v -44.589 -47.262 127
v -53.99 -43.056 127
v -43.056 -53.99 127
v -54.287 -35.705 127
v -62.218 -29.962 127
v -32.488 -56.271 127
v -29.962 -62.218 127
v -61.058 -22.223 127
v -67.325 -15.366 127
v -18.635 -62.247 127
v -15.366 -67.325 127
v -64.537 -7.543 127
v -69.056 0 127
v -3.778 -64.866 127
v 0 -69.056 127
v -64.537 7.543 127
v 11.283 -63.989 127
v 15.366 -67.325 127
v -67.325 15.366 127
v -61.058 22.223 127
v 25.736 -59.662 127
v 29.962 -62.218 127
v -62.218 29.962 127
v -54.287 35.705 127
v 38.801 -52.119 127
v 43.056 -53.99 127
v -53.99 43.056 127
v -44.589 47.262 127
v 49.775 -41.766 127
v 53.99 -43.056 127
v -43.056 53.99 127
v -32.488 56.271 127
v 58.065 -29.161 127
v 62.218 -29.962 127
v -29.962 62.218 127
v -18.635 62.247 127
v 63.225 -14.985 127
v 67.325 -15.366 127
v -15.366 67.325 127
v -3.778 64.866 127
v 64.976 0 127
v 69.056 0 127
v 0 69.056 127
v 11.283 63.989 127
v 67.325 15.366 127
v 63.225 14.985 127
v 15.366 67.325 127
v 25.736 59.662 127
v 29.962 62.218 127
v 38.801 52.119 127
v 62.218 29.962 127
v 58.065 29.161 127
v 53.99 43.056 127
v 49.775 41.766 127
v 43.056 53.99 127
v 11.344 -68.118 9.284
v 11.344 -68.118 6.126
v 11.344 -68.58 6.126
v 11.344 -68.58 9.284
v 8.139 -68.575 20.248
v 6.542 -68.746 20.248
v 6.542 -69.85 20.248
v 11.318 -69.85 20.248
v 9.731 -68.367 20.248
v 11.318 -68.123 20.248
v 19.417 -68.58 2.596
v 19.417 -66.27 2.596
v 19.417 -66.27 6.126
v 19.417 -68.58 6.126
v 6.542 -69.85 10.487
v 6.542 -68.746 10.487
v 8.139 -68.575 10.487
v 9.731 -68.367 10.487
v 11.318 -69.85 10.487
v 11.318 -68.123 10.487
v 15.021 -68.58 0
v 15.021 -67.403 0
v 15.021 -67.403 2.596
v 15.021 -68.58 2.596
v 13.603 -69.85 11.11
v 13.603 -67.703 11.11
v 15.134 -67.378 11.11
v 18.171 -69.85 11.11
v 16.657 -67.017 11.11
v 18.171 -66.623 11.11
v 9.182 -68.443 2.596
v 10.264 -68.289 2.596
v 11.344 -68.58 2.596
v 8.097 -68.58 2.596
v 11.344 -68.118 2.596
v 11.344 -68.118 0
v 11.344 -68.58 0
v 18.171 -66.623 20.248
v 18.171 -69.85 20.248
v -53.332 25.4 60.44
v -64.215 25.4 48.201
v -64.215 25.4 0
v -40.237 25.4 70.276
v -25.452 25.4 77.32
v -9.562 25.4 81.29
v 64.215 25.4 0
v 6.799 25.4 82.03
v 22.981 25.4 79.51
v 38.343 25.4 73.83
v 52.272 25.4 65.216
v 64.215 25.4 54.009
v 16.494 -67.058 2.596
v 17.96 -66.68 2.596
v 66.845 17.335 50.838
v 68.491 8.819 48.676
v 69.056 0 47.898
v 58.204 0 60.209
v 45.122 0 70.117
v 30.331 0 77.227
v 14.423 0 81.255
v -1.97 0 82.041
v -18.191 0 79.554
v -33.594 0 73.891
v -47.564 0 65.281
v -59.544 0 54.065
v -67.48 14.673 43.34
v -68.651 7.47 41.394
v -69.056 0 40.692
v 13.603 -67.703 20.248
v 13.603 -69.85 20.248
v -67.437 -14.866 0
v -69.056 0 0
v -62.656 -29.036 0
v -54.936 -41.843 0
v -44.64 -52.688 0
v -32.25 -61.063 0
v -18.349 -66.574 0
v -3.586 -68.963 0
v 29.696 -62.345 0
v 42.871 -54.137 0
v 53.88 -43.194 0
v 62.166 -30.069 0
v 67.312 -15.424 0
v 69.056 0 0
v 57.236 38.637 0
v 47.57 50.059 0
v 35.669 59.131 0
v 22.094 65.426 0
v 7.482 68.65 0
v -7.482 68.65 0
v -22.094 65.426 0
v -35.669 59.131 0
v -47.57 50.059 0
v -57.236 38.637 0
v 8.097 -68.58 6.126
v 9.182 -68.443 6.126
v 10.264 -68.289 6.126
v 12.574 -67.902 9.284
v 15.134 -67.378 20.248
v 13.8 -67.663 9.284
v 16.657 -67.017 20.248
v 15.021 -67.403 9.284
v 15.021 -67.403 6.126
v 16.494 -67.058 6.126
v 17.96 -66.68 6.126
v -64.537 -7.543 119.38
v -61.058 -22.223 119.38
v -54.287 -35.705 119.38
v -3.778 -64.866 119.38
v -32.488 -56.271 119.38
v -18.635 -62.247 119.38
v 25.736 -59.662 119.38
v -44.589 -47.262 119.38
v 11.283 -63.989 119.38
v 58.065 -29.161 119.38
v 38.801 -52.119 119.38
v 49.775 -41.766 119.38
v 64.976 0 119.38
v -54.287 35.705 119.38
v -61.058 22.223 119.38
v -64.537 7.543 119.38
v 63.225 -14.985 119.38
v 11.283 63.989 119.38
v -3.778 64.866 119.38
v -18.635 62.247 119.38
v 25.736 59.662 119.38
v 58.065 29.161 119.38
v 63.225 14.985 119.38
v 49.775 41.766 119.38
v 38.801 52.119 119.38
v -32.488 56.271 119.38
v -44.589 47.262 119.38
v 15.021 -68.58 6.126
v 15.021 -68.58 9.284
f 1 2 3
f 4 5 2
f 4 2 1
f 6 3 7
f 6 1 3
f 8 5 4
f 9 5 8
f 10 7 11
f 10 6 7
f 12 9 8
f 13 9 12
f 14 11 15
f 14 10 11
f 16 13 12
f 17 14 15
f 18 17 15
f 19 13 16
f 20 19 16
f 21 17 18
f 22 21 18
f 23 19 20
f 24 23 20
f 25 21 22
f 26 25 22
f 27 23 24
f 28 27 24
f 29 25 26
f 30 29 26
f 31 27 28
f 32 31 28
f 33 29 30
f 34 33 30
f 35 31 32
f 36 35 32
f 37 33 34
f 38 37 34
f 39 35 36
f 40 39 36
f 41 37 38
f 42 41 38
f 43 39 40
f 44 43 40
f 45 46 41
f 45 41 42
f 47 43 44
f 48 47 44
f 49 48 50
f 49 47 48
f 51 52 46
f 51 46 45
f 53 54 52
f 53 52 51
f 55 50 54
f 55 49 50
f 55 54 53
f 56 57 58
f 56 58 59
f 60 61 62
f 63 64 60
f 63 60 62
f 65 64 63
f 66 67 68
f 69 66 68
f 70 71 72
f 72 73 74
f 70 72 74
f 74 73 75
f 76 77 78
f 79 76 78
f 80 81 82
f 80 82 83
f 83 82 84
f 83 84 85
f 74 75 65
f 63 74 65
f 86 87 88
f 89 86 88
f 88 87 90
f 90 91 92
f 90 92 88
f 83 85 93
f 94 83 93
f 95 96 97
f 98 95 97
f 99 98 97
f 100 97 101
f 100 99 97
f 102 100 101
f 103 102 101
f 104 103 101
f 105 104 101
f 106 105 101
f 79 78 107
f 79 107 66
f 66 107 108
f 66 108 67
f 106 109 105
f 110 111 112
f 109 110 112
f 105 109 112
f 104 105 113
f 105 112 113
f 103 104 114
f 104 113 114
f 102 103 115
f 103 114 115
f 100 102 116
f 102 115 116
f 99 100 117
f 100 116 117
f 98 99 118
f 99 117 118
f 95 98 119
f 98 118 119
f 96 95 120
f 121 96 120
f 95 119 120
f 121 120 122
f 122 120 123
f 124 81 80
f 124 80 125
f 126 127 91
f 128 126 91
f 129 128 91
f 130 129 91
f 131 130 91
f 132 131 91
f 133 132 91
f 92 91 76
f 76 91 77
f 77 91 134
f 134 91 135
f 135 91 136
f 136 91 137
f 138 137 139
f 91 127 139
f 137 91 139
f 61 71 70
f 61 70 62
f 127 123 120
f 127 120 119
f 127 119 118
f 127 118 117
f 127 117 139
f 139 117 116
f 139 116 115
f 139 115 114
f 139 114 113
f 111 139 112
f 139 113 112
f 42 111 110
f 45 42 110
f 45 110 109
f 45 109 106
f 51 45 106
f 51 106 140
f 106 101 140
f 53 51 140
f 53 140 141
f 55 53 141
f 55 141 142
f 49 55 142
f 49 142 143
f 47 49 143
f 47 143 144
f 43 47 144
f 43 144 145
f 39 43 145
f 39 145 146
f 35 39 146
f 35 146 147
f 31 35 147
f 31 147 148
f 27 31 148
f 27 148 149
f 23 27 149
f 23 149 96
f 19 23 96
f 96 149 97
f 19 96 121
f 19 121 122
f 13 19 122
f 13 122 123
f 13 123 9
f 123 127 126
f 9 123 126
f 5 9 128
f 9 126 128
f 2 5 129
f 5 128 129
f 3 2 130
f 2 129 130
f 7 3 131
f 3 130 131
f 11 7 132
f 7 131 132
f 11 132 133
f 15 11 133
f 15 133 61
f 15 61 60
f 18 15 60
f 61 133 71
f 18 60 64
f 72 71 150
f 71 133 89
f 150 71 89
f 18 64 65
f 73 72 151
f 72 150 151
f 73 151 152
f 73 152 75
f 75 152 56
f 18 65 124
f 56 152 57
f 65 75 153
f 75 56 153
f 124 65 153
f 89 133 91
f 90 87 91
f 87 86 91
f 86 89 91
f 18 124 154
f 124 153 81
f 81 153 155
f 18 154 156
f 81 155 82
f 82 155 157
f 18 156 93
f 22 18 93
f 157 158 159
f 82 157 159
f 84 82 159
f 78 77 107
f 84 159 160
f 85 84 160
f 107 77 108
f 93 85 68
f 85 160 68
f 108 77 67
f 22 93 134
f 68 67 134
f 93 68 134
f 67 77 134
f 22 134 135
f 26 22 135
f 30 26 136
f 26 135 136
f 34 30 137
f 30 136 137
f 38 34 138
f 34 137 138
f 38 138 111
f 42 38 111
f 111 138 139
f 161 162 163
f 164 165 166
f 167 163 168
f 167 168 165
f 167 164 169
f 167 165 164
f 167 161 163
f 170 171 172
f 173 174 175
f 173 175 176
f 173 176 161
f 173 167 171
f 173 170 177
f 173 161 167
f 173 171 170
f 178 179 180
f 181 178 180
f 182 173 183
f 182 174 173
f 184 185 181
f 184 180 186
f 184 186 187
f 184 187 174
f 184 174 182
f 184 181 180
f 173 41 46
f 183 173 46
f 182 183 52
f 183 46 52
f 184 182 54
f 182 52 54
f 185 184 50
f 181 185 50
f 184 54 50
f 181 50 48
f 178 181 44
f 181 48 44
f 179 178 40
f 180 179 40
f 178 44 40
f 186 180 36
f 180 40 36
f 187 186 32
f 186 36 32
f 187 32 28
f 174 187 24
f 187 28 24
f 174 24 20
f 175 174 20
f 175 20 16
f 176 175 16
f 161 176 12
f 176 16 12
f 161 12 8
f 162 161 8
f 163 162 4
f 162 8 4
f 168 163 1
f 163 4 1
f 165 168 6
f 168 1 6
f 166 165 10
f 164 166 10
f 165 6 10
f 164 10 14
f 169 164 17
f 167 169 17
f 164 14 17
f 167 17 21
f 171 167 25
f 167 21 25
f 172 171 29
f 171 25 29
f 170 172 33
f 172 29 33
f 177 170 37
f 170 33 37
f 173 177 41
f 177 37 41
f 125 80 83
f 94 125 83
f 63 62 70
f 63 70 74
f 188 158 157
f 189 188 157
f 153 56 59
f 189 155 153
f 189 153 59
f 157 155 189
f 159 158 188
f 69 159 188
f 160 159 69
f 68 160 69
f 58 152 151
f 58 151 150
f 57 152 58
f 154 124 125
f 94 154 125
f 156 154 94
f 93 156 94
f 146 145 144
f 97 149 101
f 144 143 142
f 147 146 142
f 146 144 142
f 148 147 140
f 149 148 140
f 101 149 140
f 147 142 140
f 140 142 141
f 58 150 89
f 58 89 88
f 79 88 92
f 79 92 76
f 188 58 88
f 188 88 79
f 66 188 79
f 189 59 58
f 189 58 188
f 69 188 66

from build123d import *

# Parameters (mm, degrees)
F0_R      = 69.056327
F1_DEPTH  = 127
F2_R      = 82.153068
F3_DEPTH  = 25.4
F4_R      = 64.976359
F5_DEPTH  = 7.62
F6_W      = 3.676821
F6_H      = 9.284234
F7_DEPTH  = 68.58
F8_W      = 11.629656
F8_H      = 3.530432
F9_DEPTH  = 68.58
F10_W     = 4.776465
F10_H     = 9.760607
F11_DEPTH = 69.85
F12_W     = 4.568793
F12_H     = 9.137589
F13_DEPTH = 69.85


with BuildPart() as f1:
    # F0 (on Top) → F1 (new body)
    with BuildSketch(Plane.XY):
        Circle(F0_R)
    extrude(amount=F1_DEPTH)

    # F2 (on Front) → F3 (cut)
    with BuildSketch(Plane.XZ):
        with Locations((2.311195, 0)):
            Circle(F2_R)
    extrude(amount=-F3_DEPTH, mode=Mode.SUBTRACT)

    # F4 (on face) → F5 (cut)
    with BuildSketch(Plane.XY.offset(127)):
        Circle(F4_R)
    extrude(amount=-F5_DEPTH, mode=Mode.SUBTRACT)

    # F6 (on Front) → F7 (join)
    with BuildSketch(Plane.XZ):
        with Locations((13.182353, 4.642117)):
            Rectangle(F6_W, F6_H)
    extrude(amount=F7_DEPTH)

    # F8 (on Front) → F9 (join)
    with BuildSketch(Plane.XZ):
        with Locations((13.602547, 4.361122)):
            Rectangle(F8_W, F8_H)
    extrude(amount=F9_DEPTH)

    # F10 (on Front) → F11 (join)
    with BuildSketch(Plane.XZ):
        with Locations((8.929915, 15.367763)):
            Rectangle(F10_W, F10_H)
    extrude(amount=F11_DEPTH)

    # F12 (on Front) → F13 (join)
    with BuildSketch(Plane.XZ):
        with Locations((15.886945, 15.679271)):
            Rectangle(F12_W, F12_H)
    extrude(amount=F13_DEPTH)


solid = f1.part
